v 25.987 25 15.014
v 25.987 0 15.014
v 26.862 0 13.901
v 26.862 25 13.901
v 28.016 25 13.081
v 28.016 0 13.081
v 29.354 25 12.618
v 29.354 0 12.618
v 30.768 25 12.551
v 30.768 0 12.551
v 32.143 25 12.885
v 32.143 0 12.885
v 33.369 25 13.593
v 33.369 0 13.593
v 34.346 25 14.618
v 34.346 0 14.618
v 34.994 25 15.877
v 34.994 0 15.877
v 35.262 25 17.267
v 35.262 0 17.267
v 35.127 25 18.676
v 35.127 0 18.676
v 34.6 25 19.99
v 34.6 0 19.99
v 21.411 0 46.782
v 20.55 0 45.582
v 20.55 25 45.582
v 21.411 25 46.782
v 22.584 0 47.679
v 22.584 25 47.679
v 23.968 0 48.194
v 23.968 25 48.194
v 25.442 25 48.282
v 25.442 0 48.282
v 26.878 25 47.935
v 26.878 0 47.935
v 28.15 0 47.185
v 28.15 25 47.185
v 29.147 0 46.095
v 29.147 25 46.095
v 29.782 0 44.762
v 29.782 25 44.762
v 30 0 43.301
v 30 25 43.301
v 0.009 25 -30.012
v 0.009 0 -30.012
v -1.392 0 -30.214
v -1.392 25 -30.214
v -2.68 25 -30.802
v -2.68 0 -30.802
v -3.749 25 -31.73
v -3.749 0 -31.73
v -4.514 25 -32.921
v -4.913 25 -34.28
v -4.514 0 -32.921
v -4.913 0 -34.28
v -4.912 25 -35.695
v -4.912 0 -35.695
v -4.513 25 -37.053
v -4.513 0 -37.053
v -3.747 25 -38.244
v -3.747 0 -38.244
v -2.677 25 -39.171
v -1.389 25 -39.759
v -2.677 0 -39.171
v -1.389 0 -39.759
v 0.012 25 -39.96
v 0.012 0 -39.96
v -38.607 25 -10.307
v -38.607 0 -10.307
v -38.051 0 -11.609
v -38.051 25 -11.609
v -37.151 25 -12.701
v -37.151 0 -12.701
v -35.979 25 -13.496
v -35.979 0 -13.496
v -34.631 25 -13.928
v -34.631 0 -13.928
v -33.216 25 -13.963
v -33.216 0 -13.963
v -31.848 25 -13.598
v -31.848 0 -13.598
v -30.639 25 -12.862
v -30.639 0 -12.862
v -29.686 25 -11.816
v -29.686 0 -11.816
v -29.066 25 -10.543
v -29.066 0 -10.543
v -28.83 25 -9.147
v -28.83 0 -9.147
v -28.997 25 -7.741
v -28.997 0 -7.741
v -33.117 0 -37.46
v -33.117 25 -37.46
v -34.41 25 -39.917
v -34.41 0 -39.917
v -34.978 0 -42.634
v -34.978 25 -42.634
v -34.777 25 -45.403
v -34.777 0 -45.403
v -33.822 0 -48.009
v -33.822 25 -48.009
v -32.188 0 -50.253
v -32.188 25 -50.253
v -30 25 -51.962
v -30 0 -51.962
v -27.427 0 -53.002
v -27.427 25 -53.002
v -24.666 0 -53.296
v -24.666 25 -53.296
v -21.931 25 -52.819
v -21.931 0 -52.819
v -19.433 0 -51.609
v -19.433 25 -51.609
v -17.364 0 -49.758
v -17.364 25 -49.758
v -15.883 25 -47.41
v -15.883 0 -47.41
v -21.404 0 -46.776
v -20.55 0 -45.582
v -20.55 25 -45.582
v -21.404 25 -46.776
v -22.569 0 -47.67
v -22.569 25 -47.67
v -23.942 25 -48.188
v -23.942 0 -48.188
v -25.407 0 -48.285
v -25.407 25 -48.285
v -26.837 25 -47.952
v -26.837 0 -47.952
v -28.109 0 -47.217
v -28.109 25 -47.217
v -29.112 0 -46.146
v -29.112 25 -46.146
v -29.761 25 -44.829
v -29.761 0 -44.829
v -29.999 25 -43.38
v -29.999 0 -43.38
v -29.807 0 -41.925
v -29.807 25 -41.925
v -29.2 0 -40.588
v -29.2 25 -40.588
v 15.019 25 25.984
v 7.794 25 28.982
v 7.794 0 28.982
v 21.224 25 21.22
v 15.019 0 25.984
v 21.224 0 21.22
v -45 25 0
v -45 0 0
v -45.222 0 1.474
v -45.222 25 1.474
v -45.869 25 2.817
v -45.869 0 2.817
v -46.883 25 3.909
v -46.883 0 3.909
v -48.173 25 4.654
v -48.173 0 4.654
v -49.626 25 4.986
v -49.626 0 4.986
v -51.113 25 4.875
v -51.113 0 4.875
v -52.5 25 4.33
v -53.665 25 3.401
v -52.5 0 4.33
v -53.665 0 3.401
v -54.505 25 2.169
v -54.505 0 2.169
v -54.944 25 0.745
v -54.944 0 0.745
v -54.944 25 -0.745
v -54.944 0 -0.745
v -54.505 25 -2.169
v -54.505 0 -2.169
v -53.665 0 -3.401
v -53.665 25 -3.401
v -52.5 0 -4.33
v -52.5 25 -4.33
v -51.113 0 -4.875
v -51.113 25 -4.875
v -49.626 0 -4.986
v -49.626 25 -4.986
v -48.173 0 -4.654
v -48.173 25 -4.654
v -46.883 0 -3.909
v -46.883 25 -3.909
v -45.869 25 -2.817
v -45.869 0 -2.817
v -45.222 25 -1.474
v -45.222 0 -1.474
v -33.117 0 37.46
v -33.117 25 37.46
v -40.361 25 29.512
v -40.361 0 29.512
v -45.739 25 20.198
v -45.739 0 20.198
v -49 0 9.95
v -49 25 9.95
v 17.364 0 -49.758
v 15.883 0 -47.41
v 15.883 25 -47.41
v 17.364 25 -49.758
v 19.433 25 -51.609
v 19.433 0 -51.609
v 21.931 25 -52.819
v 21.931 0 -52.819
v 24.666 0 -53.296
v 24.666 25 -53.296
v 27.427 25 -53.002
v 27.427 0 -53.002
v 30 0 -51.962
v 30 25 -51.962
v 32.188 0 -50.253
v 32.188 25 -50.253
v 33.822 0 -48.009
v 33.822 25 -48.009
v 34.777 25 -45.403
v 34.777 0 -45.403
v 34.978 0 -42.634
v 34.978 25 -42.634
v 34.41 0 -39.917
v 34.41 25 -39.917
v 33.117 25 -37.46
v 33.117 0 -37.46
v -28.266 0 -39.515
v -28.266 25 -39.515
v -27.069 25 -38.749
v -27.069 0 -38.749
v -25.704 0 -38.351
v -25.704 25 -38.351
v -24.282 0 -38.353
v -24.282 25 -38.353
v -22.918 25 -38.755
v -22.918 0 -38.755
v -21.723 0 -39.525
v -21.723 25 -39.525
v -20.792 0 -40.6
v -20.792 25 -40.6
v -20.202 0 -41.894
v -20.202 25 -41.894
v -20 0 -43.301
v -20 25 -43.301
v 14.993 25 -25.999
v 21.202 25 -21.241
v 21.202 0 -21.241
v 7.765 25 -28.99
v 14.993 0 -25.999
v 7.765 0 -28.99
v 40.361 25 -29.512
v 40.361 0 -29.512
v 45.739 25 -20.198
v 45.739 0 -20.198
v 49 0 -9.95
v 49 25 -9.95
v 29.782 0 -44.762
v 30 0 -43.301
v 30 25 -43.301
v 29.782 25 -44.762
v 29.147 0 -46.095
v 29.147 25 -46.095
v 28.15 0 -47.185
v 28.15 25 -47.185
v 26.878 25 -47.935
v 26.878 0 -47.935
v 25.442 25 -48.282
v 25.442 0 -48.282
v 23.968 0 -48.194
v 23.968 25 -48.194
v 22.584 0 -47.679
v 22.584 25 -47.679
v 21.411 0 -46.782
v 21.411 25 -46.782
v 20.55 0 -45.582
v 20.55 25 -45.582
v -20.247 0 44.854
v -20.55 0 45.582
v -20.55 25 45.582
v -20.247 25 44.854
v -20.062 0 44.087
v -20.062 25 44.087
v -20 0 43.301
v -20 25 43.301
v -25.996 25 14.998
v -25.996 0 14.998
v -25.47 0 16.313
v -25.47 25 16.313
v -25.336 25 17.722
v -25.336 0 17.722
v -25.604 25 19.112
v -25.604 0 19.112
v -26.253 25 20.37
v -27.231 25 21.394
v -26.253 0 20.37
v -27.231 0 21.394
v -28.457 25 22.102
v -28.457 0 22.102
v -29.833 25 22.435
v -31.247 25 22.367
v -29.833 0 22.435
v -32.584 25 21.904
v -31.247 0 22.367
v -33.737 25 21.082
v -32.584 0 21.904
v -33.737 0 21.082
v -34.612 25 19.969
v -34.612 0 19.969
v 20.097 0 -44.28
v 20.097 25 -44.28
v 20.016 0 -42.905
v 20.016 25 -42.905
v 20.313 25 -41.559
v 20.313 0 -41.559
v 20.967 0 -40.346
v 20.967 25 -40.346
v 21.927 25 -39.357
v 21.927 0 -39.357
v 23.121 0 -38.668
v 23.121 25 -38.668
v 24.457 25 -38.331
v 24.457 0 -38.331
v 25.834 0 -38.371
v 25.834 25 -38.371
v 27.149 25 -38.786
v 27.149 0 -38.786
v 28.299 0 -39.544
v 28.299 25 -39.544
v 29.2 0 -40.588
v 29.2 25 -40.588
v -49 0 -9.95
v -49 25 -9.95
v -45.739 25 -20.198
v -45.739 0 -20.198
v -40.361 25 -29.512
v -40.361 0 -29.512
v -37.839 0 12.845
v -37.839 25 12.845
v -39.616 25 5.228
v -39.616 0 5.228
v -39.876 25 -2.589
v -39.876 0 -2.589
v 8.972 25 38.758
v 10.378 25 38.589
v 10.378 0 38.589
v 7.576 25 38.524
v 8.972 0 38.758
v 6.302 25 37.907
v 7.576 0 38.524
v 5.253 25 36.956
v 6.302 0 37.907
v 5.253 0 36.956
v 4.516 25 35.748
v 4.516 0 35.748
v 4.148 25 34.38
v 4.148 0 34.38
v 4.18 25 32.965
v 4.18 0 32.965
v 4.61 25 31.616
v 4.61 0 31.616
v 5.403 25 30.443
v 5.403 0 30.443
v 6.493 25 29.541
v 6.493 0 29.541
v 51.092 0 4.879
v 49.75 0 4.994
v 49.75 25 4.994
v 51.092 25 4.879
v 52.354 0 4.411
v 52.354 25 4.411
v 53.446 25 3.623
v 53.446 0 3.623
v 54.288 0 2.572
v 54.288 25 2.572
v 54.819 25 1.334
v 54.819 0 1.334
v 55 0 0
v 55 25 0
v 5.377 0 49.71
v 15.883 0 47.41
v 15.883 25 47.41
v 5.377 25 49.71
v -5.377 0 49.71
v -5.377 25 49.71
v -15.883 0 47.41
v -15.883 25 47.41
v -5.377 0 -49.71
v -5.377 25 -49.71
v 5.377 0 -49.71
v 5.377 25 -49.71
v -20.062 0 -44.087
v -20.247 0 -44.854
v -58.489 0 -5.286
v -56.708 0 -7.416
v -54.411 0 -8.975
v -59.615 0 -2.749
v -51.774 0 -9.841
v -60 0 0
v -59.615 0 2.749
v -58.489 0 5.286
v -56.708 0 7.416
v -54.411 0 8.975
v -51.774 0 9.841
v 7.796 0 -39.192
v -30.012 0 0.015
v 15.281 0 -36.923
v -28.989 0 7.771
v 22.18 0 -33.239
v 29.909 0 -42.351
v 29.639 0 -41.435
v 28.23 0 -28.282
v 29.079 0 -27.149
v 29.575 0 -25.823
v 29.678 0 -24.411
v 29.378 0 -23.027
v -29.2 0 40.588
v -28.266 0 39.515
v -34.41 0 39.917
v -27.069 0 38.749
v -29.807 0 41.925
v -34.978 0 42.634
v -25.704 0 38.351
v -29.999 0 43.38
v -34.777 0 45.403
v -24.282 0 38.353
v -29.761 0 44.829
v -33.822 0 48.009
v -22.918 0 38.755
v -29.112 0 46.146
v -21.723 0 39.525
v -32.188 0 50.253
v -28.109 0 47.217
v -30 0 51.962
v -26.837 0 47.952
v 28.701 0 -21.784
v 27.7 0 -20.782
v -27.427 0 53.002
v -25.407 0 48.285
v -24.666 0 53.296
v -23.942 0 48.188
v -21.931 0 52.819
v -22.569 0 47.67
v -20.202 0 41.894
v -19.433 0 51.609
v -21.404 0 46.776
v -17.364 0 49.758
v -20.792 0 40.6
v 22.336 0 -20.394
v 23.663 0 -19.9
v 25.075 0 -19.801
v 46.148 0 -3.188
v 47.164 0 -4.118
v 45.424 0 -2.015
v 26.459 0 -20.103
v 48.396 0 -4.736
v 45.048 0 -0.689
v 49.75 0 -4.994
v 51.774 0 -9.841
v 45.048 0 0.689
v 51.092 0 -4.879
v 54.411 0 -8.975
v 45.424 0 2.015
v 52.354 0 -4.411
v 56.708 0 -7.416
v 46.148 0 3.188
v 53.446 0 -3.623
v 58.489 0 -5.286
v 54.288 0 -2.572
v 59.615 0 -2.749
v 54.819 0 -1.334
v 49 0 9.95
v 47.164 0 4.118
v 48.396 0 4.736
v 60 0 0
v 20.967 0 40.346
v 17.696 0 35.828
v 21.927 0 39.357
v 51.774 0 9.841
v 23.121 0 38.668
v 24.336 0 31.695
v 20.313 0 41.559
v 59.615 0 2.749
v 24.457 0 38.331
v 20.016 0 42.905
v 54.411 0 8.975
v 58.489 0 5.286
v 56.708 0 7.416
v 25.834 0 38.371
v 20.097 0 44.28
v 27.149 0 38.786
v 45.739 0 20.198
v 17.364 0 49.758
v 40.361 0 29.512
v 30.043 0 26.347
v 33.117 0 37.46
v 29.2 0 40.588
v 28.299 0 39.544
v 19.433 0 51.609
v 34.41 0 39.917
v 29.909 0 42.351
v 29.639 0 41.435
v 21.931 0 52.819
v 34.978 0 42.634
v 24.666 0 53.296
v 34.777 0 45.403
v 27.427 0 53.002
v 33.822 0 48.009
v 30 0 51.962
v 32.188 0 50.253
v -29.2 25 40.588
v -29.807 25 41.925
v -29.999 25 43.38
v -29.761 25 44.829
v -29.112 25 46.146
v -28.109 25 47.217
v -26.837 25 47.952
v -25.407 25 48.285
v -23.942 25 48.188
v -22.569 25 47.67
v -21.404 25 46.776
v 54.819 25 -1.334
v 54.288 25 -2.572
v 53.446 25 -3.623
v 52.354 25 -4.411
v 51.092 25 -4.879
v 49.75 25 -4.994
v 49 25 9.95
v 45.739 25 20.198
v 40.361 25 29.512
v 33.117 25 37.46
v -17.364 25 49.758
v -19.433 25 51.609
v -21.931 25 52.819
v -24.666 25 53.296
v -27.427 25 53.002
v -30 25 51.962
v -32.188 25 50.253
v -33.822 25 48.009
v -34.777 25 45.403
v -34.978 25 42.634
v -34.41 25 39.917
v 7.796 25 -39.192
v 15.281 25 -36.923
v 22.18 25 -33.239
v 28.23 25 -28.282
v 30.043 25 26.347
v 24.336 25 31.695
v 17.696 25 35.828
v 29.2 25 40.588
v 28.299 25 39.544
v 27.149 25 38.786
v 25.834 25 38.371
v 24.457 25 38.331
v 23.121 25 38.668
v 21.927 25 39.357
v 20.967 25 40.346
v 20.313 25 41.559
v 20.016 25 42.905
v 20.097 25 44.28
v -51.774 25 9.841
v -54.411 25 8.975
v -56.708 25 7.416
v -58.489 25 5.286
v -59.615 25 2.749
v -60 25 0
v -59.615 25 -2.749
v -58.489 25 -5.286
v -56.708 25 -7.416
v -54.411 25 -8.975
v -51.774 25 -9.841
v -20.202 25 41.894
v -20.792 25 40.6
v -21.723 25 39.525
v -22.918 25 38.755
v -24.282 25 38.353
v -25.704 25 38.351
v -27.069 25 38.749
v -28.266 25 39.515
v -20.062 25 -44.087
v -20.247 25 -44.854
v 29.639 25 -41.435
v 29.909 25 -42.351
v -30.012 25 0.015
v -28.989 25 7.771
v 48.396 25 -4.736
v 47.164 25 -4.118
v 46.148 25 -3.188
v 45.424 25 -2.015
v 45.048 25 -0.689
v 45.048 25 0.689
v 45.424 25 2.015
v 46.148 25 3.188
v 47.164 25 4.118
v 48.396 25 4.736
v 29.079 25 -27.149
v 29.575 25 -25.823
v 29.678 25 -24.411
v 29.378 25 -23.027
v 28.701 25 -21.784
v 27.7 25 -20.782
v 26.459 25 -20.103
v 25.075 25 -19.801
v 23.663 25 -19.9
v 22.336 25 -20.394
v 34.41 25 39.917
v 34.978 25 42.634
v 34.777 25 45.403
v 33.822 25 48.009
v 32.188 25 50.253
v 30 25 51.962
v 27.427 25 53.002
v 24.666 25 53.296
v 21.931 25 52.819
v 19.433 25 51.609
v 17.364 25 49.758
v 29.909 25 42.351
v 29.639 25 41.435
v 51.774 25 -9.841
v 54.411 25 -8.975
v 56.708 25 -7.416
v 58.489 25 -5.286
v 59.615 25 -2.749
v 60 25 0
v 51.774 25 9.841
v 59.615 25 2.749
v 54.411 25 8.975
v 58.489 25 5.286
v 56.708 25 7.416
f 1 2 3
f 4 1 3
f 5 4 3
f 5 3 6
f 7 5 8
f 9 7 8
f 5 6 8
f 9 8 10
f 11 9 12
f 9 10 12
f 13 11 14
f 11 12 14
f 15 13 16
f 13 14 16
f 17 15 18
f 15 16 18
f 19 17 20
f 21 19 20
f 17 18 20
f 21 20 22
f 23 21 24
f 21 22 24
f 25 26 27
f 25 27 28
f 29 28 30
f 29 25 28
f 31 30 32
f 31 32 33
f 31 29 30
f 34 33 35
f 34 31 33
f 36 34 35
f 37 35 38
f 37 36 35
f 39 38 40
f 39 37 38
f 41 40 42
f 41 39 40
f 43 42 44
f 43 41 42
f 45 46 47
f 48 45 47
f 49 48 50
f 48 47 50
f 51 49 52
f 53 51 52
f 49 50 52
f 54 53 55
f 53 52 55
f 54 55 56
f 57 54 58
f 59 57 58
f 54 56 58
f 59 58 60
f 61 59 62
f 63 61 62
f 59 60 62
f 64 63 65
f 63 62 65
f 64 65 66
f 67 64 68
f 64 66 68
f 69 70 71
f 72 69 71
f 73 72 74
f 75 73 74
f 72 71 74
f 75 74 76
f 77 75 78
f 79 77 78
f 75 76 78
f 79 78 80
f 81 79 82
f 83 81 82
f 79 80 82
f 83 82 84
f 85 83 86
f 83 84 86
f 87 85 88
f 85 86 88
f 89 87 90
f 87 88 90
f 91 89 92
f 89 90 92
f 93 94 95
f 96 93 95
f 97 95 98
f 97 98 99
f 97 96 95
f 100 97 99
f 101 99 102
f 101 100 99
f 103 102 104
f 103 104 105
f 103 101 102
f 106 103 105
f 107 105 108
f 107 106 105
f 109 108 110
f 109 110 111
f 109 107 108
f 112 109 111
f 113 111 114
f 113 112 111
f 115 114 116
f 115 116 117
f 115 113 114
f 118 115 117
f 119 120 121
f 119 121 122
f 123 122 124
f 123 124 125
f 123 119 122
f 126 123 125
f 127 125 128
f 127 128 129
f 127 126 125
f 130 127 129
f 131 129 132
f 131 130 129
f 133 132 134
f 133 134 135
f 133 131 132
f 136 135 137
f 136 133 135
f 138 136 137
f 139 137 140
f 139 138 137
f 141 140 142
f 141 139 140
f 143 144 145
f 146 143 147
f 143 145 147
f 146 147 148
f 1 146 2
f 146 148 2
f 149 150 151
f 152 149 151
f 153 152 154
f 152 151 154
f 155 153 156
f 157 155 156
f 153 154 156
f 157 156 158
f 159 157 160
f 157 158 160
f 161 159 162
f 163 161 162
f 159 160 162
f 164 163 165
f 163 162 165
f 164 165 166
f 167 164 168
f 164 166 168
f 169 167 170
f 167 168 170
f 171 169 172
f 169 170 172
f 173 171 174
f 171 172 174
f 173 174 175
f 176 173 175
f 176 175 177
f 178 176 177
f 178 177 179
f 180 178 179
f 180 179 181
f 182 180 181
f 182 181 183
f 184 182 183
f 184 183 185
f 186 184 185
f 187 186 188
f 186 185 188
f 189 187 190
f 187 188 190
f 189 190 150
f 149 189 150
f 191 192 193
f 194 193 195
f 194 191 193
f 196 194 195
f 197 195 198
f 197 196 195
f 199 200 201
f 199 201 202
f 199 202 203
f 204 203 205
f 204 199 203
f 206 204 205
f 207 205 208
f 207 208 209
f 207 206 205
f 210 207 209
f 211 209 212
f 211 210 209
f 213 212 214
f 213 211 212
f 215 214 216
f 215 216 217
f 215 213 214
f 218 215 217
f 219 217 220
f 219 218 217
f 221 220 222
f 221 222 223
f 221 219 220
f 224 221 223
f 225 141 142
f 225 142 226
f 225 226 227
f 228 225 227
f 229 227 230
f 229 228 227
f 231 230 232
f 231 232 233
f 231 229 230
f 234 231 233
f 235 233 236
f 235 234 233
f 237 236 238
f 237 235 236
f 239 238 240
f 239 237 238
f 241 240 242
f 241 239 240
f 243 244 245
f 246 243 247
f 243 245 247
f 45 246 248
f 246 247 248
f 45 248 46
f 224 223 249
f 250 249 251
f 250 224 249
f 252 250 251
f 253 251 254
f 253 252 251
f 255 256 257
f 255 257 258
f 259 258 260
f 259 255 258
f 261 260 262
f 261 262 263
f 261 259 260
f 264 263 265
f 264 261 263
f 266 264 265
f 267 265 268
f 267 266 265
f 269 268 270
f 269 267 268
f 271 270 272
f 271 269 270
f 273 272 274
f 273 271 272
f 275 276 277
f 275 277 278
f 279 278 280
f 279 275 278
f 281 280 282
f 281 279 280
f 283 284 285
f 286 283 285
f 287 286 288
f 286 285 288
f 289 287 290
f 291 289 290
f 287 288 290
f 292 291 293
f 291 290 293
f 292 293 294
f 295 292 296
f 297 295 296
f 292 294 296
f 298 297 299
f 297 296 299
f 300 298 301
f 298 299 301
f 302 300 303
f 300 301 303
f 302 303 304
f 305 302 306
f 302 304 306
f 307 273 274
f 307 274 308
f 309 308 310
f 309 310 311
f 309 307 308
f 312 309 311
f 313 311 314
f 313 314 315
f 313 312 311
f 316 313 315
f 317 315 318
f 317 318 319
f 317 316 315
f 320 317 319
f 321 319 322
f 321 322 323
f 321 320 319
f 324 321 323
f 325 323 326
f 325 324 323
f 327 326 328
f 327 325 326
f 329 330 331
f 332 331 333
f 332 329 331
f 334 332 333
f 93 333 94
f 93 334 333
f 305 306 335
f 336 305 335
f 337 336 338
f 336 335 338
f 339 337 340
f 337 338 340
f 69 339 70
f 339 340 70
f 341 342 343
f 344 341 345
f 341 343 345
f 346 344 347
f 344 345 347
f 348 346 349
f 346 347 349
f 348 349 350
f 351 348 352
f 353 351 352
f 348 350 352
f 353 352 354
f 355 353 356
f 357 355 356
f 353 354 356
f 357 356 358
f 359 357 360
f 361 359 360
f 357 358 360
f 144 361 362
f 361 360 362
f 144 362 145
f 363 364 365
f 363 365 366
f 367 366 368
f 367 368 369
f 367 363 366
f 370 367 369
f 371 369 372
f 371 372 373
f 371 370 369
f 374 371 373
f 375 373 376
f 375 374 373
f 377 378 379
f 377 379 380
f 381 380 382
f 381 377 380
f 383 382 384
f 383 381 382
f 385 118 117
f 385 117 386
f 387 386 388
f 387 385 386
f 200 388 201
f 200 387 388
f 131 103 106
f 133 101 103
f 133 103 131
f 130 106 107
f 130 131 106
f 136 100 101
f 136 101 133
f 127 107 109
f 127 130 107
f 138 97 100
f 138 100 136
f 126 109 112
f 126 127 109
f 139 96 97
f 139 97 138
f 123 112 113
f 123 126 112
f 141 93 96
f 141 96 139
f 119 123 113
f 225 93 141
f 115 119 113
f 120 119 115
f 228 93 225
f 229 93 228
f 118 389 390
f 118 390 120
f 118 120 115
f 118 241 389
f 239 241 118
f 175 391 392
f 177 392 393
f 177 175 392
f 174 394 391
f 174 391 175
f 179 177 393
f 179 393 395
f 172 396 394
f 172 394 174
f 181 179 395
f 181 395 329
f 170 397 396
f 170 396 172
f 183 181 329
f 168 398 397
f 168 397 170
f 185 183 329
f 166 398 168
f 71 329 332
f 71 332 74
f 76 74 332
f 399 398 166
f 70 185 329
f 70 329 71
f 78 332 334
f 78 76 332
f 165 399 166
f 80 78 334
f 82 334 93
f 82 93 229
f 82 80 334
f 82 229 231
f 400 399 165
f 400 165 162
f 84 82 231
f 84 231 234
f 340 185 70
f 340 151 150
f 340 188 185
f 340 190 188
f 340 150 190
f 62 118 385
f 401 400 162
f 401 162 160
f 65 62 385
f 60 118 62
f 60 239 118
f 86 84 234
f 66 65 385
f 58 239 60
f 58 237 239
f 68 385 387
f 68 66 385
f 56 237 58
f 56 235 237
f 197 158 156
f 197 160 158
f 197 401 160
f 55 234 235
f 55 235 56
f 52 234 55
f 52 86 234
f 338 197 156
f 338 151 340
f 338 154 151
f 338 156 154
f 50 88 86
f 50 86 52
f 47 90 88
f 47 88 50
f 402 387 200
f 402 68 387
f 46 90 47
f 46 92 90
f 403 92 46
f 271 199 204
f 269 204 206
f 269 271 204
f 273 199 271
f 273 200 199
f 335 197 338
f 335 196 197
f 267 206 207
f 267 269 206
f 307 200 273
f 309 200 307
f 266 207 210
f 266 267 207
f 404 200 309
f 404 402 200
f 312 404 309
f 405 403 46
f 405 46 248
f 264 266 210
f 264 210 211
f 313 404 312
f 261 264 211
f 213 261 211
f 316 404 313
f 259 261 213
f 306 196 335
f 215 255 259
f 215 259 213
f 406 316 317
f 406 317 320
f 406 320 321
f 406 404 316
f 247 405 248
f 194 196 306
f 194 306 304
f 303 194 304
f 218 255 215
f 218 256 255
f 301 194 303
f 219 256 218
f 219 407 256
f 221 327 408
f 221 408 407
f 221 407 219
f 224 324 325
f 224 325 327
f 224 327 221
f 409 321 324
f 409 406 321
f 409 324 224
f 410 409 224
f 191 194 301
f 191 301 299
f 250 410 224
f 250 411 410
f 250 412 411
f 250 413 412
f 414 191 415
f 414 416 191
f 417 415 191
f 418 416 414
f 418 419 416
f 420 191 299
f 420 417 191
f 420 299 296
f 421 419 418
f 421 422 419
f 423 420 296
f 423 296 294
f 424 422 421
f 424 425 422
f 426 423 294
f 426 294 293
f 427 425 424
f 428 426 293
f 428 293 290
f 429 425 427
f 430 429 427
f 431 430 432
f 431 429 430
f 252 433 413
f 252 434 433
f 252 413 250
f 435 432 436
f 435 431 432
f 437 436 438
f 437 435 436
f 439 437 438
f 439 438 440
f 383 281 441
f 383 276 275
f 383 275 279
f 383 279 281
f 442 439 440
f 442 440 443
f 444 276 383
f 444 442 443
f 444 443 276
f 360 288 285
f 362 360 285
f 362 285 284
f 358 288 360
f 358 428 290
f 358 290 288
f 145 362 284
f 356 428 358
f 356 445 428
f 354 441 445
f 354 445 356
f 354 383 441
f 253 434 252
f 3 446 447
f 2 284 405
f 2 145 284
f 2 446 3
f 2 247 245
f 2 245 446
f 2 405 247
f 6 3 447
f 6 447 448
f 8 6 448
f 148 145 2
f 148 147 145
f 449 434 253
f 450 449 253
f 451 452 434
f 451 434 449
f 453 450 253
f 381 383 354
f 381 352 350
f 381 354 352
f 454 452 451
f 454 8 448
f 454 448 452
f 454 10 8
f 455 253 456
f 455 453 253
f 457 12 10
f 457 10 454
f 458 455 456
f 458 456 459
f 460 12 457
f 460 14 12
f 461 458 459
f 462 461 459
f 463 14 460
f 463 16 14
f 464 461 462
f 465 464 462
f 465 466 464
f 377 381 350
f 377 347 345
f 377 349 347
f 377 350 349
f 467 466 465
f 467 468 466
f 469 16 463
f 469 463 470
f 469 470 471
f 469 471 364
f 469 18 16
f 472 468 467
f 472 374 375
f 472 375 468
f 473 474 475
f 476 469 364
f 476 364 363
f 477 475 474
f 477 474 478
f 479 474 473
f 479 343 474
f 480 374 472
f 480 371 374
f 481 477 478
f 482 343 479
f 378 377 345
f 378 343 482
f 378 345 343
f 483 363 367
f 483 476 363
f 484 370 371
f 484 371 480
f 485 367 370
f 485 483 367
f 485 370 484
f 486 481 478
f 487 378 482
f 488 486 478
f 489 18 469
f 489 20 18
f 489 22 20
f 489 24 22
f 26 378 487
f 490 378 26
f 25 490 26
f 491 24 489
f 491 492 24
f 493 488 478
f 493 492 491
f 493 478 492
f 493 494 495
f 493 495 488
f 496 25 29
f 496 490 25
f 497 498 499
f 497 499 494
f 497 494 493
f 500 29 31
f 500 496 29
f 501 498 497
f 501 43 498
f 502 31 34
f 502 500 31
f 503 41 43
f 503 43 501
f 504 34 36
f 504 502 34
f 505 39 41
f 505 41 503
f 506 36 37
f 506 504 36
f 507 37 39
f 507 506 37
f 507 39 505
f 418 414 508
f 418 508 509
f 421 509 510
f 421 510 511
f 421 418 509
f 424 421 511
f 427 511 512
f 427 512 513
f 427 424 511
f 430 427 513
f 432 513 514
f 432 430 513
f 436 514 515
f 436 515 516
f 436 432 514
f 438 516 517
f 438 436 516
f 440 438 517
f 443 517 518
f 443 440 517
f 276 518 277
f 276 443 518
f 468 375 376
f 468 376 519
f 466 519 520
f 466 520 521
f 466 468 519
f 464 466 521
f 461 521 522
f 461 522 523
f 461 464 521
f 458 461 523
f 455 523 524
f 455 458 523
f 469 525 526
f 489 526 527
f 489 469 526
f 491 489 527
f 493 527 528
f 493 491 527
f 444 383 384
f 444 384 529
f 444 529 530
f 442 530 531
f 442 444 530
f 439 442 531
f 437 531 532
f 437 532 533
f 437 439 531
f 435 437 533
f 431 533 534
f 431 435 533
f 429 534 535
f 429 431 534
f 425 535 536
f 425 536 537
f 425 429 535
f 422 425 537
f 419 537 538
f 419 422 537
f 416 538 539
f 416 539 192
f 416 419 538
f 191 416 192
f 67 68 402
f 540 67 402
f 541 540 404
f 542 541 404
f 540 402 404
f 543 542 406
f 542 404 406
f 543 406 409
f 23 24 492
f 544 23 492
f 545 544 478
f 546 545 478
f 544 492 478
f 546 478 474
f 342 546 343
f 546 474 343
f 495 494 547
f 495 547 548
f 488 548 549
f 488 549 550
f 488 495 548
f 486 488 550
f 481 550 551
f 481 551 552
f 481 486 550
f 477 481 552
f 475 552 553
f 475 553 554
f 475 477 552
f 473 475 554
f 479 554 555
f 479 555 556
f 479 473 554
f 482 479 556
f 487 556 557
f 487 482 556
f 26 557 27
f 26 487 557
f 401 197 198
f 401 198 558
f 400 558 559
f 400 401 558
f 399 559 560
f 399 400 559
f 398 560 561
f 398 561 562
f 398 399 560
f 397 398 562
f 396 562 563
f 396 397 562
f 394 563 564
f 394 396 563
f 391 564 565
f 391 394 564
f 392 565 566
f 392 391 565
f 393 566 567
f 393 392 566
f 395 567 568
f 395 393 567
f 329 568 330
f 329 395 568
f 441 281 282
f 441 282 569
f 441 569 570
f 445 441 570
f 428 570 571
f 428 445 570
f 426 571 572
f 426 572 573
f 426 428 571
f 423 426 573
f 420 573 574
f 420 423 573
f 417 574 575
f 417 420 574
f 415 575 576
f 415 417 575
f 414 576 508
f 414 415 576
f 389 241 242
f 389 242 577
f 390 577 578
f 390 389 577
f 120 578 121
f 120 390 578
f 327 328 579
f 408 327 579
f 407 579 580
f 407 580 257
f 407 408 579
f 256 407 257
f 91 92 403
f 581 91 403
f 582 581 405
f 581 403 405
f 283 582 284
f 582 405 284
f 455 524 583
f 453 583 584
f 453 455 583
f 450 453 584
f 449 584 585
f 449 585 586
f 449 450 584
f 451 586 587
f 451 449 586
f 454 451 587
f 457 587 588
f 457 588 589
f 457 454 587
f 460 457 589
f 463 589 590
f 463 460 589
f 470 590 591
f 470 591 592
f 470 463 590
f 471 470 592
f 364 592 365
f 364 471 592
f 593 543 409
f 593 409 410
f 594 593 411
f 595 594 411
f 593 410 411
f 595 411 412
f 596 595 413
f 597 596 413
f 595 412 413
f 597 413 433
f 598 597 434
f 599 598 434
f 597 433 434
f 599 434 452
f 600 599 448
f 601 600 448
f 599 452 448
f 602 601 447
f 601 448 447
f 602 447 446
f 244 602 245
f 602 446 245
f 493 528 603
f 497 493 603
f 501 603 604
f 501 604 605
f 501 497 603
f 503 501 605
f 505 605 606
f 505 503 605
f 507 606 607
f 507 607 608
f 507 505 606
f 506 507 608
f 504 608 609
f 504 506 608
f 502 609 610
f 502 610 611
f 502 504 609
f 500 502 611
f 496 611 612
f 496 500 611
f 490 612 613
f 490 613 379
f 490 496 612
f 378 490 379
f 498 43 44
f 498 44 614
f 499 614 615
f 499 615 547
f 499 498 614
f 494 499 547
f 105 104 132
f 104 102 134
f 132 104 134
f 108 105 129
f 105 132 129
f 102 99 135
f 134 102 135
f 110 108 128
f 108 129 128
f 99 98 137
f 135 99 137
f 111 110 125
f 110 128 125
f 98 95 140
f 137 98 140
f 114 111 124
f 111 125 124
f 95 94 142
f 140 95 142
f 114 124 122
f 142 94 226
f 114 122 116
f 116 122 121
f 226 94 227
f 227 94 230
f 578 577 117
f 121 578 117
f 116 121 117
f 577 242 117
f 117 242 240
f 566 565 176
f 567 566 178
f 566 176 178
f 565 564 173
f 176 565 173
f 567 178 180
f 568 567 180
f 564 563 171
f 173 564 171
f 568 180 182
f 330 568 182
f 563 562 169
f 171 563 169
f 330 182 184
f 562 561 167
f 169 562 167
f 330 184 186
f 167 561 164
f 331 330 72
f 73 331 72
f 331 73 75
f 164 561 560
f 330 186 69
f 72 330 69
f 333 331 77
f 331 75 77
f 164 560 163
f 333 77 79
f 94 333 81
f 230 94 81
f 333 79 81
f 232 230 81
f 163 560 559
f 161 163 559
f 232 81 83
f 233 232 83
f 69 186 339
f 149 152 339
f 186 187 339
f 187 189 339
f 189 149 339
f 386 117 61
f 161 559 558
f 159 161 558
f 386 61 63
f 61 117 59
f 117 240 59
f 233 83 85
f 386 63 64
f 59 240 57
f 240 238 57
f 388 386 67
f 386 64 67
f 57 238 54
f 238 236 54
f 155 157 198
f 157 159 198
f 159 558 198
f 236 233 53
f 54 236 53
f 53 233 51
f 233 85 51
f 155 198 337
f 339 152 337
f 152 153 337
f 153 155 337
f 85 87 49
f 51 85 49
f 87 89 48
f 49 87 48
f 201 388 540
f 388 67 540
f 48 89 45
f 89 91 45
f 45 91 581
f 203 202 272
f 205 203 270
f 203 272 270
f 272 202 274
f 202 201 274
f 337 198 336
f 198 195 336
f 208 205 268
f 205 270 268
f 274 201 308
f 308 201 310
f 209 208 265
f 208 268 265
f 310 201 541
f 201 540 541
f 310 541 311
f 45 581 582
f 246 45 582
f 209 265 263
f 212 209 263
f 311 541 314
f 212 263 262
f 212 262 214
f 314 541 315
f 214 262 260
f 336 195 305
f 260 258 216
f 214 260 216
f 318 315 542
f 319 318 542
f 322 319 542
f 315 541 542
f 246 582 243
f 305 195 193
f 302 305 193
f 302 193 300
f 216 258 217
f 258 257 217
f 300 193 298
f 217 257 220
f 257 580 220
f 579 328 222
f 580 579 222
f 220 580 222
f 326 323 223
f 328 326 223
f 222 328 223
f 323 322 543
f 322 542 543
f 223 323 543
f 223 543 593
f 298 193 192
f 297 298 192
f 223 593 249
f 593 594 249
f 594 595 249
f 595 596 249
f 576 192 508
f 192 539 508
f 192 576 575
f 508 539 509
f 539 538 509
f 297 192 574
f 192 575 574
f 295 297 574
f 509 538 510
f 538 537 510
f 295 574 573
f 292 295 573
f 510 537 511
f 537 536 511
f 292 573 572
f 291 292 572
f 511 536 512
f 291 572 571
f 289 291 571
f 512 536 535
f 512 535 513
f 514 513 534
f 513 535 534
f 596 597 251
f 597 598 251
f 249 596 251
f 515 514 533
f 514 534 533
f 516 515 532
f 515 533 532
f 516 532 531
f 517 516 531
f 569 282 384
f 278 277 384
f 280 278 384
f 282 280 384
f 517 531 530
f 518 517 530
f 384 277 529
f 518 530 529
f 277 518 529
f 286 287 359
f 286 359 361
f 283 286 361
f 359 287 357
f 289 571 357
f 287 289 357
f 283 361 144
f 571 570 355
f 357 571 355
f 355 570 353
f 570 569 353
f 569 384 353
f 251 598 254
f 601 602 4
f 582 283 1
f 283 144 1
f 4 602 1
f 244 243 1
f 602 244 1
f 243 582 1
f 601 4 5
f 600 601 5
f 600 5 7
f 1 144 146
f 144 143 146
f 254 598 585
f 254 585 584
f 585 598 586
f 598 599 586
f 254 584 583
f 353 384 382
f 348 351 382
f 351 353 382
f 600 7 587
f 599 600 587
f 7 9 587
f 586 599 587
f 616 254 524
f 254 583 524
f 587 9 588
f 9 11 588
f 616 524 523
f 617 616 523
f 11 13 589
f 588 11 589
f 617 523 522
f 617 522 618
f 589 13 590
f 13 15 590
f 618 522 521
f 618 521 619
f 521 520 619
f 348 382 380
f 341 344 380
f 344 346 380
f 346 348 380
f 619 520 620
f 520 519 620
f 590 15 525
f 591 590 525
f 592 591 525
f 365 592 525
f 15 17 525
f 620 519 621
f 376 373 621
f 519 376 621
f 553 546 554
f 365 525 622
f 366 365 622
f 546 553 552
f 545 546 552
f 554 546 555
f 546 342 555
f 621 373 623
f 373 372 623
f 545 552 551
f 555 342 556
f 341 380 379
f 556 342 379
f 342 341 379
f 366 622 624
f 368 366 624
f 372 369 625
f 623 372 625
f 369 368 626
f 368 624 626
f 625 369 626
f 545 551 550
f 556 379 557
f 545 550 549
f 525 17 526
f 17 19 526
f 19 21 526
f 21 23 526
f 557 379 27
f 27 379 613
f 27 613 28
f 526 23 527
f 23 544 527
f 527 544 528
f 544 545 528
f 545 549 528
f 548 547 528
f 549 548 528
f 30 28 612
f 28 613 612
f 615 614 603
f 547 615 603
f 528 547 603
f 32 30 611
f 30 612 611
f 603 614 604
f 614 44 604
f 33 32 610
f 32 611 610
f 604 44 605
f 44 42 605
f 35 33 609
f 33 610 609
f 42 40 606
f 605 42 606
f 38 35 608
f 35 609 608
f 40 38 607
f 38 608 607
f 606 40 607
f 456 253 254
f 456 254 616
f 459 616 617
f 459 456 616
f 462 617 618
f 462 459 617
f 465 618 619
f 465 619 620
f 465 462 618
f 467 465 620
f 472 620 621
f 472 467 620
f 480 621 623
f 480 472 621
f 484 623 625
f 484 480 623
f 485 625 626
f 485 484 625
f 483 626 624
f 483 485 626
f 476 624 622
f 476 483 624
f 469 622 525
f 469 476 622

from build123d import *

# Parameters (mm, degrees)
F0_R     = 5
F2_DEPTH = 25
F3_DEPTH = 25.001


with BuildPart() as f2:
    # F0 (on Front) → F2 (new body)
    with BuildSketch(Plane.XZ):
        with BuildLine():
            ThreePointArc((-49, 9.949874), (-60, 0), (-49, -9.949874))
            ThreePointArc((-49, -9.949874), (-43.30127, -25), (-33.116844, -37.460308))
            ThreePointArc((-33.116844, -37.460308), (-31.197495, -39.073217), (-29.199711, -40.587891))
            ThreePointArc((-29.199711, -40.587891), (-23.585531, -38.505514), (-20, -43.30127))
            ThreePointArc((-20, -43.30127), (-20.139519, -44.474182), (-20.550289, -45.581637))
            ThreePointArc((-20.550289, -45.581637), (-18.239651, -46.554432), (-15.883156, -47.410182))
            ThreePointArc((-15.883156, -47.410182), (0, -50), (15.883156, -47.410182))
            ThreePointArc((15.883156, -47.410182), (18.239651, -46.554432), (20.550289, -45.581637))
            ThreePointArc((20.550289, -45.581637), (22.5, -38.971143), (29.199711, -40.587891))
            ThreePointArc((29.199711, -40.587891), (31.197495, -39.073217), (33.116844, -37.460308))
            ThreePointArc((33.116844, -37.460308), (43.30127, -25), (49, -9.949874))
            ThreePointArc((49, -9.949874), (49.437146, -7.481215), (49.75, -4.993746))
            ThreePointArc((49.75, -4.993746), (45, 0), (49.75, 4.993746))
            ThreePointArc((49.75, 4.993746), (49.437146, 7.481215), (49, 9.949874))
            ThreePointArc((49, 9.949874), (43.30127, 25), (33.116844, 37.460308))
            ThreePointArc((33.116844, 37.460308), (31.197495, 39.073217), (29.199711, 40.587891))
            ThreePointArc((29.199711, 40.587891), (22.5, 38.971143), (20.550289, 45.581637))
            ThreePointArc((20.550289, 45.581637), (18.239651, 46.554432), (15.883156, 47.410182))
            ThreePointArc((15.883156, 47.410182), (0, 50), (-15.883156, 47.410182))
            ThreePointArc((-15.883156, 47.410182), (-18.239651, 46.554432), (-20.550289, 45.581637))
            ThreePointArc((-20.550289, 45.581637), (-20.139519, 44.474182), (-20, 43.30127))
            ThreePointArc((-20, 43.30127), (-23.585531, 38.505514), (-29.199711, 40.587891))
            ThreePointArc((-29.199711, 40.587891), (-31.197495, 39.073217), (-33.116844, 37.460308))
            ThreePointArc((-33.116844, 37.460308), (-43.30127, 25), (-49, 9.949874))
        make_face()
        with Locations((-50, 0)):
            Circle(F0_R, mode=Mode.SUBTRACT)
        with BuildLine():
            ThreePointArc((-15.883156, 47.410182), (-30, 51.961524), (-33.116844, 37.460308))
            ThreePointArc((-33.116844, 37.460308), (-31.197495, 39.073217), (-29.199711, 40.587891))
            ThreePointArc((-29.199711, 40.587891), (-27.5, 47.631397), (-20.550289, 45.581637))
            ThreePointArc((-20.550289, 45.581637), (-18.239651, 46.554432), (-15.883156, 47.410182))
        make_face()
        with BuildLine():
            ThreePointArc((33.116844, 37.460308), (30, 51.961524), (15.883156, 47.410182))
            ThreePointArc((15.883156, 47.410182), (18.239651, 46.554432), (20.550289, 45.581637))
            ThreePointArc((20.550289, 45.581637), (26.172912, 48.161751), (30, 43.30127))
            ThreePointArc((30, 43.30127), (29.795756, 41.886801), (29.199711, 40.587891))
            ThreePointArc((29.199711, 40.587891), (31.197495, 39.073217), (33.116844, 37.460308))
        make_face()
        with BuildLine():
            ThreePointArc((49.75, -4.993746), (49.437146, -7.481215), (49, -9.949874))
            ThreePointArc((49, -9.949874), (60, 0), (49, 9.949874))
            ThreePointArc((49, 9.949874), (49.437146, 7.481215), (49.75, 4.993746))
            ThreePointArc((49.75, 4.993746), (53.446012, 3.622844), (55, 0))
            ThreePointArc((55, 0), (53.446012, -3.622844), (49.75, -4.993746))
        make_face()
        with BuildLine():
            ThreePointArc((20.550289, -45.581637), (18.239651, -46.554432), (15.883156, -47.410182))
            ThreePointArc((15.883156, -47.410182), (30, -51.961524), (33.116844, -37.460308))
            ThreePointArc((33.116844, -37.460308), (31.197495, -39.073217), (29.199711, -40.587891))
            ThreePointArc((29.199711, -40.587891), (29.795756, -41.886801), (30, -43.30127))
            ThreePointArc((30, -43.30127), (26.172912, -48.161751), (20.550289, -45.581637))
        make_face()
        with BuildLine():
            ThreePointArc((-29.199711, -40.587891), (-31.197495, -39.073217), (-33.116844, -37.460308))
            ThreePointArc((-33.116844, -37.460308), (-30, -51.961524), (-15.883156, -47.410182))
            ThreePointArc((-15.883156, -47.410182), (-18.239651, -46.554432), (-20.550289, -45.581637))
            ThreePointArc((-20.550289, -45.581637), (-27.5, -47.631397), (-29.199711, -40.587891))
        make_face()
    extrude(amount=-F2_DEPTH)

    # F1 (on face) → F3 (cut, through all)
    with BuildSketch(Plane.XZ):
        with BuildLine():
            ThreePointArc((-34.61205, 19.969401), (-39.616154, 5.22794), (-38.60747, -10.306999))
            ThreePointArc((-38.60747, -10.306999), (-32.51911, -13.829545), (-28.996565, -7.741185))
            ThreePointArc((-28.996565, -7.741185), (-29.754147, 3.926501), (-25.99576, 14.998238))
            ThreePointArc((-25.99576, 14.998238), (-27.818323, 21.791965), (-34.61205, 19.969401))
        make_face()
        with BuildLine():
            ThreePointArc((34.600034, 19.990214), (24.335605, 31.694626), (10.377612, 38.588549))
            ThreePointArc((10.377612, 38.588549), (4.282818, 35.077148), (7.79422, 28.982354))
            ThreePointArc((7.79422, 28.982354), (18.277524, 23.804597), (25.986735, 15.013869))
            ThreePointArc((25.986735, 15.013869), (32.781557, 13.195392), (34.600034, 19.990214))
        make_face()
        with BuildLine():
            ThreePointArc((0.012016, -39.959615), (15.280548, -36.922565), (28.229858, -28.28155))
            ThreePointArc((28.229858, -28.28155), (28.236292, -21.247603), (21.202345, -21.241169))
            ThreePointArc((21.202345, -21.241169), (11.476624, -27.731098), (0.009025, -30.012108))
            ThreePointArc((0.009025, -30.012108), (-4.963233, -34.987357), (0.012016, -39.959615))
        make_face()
    extrude(amount=-F3_DEPTH, mode=Mode.SUBTRACT)


solid = f2.part
